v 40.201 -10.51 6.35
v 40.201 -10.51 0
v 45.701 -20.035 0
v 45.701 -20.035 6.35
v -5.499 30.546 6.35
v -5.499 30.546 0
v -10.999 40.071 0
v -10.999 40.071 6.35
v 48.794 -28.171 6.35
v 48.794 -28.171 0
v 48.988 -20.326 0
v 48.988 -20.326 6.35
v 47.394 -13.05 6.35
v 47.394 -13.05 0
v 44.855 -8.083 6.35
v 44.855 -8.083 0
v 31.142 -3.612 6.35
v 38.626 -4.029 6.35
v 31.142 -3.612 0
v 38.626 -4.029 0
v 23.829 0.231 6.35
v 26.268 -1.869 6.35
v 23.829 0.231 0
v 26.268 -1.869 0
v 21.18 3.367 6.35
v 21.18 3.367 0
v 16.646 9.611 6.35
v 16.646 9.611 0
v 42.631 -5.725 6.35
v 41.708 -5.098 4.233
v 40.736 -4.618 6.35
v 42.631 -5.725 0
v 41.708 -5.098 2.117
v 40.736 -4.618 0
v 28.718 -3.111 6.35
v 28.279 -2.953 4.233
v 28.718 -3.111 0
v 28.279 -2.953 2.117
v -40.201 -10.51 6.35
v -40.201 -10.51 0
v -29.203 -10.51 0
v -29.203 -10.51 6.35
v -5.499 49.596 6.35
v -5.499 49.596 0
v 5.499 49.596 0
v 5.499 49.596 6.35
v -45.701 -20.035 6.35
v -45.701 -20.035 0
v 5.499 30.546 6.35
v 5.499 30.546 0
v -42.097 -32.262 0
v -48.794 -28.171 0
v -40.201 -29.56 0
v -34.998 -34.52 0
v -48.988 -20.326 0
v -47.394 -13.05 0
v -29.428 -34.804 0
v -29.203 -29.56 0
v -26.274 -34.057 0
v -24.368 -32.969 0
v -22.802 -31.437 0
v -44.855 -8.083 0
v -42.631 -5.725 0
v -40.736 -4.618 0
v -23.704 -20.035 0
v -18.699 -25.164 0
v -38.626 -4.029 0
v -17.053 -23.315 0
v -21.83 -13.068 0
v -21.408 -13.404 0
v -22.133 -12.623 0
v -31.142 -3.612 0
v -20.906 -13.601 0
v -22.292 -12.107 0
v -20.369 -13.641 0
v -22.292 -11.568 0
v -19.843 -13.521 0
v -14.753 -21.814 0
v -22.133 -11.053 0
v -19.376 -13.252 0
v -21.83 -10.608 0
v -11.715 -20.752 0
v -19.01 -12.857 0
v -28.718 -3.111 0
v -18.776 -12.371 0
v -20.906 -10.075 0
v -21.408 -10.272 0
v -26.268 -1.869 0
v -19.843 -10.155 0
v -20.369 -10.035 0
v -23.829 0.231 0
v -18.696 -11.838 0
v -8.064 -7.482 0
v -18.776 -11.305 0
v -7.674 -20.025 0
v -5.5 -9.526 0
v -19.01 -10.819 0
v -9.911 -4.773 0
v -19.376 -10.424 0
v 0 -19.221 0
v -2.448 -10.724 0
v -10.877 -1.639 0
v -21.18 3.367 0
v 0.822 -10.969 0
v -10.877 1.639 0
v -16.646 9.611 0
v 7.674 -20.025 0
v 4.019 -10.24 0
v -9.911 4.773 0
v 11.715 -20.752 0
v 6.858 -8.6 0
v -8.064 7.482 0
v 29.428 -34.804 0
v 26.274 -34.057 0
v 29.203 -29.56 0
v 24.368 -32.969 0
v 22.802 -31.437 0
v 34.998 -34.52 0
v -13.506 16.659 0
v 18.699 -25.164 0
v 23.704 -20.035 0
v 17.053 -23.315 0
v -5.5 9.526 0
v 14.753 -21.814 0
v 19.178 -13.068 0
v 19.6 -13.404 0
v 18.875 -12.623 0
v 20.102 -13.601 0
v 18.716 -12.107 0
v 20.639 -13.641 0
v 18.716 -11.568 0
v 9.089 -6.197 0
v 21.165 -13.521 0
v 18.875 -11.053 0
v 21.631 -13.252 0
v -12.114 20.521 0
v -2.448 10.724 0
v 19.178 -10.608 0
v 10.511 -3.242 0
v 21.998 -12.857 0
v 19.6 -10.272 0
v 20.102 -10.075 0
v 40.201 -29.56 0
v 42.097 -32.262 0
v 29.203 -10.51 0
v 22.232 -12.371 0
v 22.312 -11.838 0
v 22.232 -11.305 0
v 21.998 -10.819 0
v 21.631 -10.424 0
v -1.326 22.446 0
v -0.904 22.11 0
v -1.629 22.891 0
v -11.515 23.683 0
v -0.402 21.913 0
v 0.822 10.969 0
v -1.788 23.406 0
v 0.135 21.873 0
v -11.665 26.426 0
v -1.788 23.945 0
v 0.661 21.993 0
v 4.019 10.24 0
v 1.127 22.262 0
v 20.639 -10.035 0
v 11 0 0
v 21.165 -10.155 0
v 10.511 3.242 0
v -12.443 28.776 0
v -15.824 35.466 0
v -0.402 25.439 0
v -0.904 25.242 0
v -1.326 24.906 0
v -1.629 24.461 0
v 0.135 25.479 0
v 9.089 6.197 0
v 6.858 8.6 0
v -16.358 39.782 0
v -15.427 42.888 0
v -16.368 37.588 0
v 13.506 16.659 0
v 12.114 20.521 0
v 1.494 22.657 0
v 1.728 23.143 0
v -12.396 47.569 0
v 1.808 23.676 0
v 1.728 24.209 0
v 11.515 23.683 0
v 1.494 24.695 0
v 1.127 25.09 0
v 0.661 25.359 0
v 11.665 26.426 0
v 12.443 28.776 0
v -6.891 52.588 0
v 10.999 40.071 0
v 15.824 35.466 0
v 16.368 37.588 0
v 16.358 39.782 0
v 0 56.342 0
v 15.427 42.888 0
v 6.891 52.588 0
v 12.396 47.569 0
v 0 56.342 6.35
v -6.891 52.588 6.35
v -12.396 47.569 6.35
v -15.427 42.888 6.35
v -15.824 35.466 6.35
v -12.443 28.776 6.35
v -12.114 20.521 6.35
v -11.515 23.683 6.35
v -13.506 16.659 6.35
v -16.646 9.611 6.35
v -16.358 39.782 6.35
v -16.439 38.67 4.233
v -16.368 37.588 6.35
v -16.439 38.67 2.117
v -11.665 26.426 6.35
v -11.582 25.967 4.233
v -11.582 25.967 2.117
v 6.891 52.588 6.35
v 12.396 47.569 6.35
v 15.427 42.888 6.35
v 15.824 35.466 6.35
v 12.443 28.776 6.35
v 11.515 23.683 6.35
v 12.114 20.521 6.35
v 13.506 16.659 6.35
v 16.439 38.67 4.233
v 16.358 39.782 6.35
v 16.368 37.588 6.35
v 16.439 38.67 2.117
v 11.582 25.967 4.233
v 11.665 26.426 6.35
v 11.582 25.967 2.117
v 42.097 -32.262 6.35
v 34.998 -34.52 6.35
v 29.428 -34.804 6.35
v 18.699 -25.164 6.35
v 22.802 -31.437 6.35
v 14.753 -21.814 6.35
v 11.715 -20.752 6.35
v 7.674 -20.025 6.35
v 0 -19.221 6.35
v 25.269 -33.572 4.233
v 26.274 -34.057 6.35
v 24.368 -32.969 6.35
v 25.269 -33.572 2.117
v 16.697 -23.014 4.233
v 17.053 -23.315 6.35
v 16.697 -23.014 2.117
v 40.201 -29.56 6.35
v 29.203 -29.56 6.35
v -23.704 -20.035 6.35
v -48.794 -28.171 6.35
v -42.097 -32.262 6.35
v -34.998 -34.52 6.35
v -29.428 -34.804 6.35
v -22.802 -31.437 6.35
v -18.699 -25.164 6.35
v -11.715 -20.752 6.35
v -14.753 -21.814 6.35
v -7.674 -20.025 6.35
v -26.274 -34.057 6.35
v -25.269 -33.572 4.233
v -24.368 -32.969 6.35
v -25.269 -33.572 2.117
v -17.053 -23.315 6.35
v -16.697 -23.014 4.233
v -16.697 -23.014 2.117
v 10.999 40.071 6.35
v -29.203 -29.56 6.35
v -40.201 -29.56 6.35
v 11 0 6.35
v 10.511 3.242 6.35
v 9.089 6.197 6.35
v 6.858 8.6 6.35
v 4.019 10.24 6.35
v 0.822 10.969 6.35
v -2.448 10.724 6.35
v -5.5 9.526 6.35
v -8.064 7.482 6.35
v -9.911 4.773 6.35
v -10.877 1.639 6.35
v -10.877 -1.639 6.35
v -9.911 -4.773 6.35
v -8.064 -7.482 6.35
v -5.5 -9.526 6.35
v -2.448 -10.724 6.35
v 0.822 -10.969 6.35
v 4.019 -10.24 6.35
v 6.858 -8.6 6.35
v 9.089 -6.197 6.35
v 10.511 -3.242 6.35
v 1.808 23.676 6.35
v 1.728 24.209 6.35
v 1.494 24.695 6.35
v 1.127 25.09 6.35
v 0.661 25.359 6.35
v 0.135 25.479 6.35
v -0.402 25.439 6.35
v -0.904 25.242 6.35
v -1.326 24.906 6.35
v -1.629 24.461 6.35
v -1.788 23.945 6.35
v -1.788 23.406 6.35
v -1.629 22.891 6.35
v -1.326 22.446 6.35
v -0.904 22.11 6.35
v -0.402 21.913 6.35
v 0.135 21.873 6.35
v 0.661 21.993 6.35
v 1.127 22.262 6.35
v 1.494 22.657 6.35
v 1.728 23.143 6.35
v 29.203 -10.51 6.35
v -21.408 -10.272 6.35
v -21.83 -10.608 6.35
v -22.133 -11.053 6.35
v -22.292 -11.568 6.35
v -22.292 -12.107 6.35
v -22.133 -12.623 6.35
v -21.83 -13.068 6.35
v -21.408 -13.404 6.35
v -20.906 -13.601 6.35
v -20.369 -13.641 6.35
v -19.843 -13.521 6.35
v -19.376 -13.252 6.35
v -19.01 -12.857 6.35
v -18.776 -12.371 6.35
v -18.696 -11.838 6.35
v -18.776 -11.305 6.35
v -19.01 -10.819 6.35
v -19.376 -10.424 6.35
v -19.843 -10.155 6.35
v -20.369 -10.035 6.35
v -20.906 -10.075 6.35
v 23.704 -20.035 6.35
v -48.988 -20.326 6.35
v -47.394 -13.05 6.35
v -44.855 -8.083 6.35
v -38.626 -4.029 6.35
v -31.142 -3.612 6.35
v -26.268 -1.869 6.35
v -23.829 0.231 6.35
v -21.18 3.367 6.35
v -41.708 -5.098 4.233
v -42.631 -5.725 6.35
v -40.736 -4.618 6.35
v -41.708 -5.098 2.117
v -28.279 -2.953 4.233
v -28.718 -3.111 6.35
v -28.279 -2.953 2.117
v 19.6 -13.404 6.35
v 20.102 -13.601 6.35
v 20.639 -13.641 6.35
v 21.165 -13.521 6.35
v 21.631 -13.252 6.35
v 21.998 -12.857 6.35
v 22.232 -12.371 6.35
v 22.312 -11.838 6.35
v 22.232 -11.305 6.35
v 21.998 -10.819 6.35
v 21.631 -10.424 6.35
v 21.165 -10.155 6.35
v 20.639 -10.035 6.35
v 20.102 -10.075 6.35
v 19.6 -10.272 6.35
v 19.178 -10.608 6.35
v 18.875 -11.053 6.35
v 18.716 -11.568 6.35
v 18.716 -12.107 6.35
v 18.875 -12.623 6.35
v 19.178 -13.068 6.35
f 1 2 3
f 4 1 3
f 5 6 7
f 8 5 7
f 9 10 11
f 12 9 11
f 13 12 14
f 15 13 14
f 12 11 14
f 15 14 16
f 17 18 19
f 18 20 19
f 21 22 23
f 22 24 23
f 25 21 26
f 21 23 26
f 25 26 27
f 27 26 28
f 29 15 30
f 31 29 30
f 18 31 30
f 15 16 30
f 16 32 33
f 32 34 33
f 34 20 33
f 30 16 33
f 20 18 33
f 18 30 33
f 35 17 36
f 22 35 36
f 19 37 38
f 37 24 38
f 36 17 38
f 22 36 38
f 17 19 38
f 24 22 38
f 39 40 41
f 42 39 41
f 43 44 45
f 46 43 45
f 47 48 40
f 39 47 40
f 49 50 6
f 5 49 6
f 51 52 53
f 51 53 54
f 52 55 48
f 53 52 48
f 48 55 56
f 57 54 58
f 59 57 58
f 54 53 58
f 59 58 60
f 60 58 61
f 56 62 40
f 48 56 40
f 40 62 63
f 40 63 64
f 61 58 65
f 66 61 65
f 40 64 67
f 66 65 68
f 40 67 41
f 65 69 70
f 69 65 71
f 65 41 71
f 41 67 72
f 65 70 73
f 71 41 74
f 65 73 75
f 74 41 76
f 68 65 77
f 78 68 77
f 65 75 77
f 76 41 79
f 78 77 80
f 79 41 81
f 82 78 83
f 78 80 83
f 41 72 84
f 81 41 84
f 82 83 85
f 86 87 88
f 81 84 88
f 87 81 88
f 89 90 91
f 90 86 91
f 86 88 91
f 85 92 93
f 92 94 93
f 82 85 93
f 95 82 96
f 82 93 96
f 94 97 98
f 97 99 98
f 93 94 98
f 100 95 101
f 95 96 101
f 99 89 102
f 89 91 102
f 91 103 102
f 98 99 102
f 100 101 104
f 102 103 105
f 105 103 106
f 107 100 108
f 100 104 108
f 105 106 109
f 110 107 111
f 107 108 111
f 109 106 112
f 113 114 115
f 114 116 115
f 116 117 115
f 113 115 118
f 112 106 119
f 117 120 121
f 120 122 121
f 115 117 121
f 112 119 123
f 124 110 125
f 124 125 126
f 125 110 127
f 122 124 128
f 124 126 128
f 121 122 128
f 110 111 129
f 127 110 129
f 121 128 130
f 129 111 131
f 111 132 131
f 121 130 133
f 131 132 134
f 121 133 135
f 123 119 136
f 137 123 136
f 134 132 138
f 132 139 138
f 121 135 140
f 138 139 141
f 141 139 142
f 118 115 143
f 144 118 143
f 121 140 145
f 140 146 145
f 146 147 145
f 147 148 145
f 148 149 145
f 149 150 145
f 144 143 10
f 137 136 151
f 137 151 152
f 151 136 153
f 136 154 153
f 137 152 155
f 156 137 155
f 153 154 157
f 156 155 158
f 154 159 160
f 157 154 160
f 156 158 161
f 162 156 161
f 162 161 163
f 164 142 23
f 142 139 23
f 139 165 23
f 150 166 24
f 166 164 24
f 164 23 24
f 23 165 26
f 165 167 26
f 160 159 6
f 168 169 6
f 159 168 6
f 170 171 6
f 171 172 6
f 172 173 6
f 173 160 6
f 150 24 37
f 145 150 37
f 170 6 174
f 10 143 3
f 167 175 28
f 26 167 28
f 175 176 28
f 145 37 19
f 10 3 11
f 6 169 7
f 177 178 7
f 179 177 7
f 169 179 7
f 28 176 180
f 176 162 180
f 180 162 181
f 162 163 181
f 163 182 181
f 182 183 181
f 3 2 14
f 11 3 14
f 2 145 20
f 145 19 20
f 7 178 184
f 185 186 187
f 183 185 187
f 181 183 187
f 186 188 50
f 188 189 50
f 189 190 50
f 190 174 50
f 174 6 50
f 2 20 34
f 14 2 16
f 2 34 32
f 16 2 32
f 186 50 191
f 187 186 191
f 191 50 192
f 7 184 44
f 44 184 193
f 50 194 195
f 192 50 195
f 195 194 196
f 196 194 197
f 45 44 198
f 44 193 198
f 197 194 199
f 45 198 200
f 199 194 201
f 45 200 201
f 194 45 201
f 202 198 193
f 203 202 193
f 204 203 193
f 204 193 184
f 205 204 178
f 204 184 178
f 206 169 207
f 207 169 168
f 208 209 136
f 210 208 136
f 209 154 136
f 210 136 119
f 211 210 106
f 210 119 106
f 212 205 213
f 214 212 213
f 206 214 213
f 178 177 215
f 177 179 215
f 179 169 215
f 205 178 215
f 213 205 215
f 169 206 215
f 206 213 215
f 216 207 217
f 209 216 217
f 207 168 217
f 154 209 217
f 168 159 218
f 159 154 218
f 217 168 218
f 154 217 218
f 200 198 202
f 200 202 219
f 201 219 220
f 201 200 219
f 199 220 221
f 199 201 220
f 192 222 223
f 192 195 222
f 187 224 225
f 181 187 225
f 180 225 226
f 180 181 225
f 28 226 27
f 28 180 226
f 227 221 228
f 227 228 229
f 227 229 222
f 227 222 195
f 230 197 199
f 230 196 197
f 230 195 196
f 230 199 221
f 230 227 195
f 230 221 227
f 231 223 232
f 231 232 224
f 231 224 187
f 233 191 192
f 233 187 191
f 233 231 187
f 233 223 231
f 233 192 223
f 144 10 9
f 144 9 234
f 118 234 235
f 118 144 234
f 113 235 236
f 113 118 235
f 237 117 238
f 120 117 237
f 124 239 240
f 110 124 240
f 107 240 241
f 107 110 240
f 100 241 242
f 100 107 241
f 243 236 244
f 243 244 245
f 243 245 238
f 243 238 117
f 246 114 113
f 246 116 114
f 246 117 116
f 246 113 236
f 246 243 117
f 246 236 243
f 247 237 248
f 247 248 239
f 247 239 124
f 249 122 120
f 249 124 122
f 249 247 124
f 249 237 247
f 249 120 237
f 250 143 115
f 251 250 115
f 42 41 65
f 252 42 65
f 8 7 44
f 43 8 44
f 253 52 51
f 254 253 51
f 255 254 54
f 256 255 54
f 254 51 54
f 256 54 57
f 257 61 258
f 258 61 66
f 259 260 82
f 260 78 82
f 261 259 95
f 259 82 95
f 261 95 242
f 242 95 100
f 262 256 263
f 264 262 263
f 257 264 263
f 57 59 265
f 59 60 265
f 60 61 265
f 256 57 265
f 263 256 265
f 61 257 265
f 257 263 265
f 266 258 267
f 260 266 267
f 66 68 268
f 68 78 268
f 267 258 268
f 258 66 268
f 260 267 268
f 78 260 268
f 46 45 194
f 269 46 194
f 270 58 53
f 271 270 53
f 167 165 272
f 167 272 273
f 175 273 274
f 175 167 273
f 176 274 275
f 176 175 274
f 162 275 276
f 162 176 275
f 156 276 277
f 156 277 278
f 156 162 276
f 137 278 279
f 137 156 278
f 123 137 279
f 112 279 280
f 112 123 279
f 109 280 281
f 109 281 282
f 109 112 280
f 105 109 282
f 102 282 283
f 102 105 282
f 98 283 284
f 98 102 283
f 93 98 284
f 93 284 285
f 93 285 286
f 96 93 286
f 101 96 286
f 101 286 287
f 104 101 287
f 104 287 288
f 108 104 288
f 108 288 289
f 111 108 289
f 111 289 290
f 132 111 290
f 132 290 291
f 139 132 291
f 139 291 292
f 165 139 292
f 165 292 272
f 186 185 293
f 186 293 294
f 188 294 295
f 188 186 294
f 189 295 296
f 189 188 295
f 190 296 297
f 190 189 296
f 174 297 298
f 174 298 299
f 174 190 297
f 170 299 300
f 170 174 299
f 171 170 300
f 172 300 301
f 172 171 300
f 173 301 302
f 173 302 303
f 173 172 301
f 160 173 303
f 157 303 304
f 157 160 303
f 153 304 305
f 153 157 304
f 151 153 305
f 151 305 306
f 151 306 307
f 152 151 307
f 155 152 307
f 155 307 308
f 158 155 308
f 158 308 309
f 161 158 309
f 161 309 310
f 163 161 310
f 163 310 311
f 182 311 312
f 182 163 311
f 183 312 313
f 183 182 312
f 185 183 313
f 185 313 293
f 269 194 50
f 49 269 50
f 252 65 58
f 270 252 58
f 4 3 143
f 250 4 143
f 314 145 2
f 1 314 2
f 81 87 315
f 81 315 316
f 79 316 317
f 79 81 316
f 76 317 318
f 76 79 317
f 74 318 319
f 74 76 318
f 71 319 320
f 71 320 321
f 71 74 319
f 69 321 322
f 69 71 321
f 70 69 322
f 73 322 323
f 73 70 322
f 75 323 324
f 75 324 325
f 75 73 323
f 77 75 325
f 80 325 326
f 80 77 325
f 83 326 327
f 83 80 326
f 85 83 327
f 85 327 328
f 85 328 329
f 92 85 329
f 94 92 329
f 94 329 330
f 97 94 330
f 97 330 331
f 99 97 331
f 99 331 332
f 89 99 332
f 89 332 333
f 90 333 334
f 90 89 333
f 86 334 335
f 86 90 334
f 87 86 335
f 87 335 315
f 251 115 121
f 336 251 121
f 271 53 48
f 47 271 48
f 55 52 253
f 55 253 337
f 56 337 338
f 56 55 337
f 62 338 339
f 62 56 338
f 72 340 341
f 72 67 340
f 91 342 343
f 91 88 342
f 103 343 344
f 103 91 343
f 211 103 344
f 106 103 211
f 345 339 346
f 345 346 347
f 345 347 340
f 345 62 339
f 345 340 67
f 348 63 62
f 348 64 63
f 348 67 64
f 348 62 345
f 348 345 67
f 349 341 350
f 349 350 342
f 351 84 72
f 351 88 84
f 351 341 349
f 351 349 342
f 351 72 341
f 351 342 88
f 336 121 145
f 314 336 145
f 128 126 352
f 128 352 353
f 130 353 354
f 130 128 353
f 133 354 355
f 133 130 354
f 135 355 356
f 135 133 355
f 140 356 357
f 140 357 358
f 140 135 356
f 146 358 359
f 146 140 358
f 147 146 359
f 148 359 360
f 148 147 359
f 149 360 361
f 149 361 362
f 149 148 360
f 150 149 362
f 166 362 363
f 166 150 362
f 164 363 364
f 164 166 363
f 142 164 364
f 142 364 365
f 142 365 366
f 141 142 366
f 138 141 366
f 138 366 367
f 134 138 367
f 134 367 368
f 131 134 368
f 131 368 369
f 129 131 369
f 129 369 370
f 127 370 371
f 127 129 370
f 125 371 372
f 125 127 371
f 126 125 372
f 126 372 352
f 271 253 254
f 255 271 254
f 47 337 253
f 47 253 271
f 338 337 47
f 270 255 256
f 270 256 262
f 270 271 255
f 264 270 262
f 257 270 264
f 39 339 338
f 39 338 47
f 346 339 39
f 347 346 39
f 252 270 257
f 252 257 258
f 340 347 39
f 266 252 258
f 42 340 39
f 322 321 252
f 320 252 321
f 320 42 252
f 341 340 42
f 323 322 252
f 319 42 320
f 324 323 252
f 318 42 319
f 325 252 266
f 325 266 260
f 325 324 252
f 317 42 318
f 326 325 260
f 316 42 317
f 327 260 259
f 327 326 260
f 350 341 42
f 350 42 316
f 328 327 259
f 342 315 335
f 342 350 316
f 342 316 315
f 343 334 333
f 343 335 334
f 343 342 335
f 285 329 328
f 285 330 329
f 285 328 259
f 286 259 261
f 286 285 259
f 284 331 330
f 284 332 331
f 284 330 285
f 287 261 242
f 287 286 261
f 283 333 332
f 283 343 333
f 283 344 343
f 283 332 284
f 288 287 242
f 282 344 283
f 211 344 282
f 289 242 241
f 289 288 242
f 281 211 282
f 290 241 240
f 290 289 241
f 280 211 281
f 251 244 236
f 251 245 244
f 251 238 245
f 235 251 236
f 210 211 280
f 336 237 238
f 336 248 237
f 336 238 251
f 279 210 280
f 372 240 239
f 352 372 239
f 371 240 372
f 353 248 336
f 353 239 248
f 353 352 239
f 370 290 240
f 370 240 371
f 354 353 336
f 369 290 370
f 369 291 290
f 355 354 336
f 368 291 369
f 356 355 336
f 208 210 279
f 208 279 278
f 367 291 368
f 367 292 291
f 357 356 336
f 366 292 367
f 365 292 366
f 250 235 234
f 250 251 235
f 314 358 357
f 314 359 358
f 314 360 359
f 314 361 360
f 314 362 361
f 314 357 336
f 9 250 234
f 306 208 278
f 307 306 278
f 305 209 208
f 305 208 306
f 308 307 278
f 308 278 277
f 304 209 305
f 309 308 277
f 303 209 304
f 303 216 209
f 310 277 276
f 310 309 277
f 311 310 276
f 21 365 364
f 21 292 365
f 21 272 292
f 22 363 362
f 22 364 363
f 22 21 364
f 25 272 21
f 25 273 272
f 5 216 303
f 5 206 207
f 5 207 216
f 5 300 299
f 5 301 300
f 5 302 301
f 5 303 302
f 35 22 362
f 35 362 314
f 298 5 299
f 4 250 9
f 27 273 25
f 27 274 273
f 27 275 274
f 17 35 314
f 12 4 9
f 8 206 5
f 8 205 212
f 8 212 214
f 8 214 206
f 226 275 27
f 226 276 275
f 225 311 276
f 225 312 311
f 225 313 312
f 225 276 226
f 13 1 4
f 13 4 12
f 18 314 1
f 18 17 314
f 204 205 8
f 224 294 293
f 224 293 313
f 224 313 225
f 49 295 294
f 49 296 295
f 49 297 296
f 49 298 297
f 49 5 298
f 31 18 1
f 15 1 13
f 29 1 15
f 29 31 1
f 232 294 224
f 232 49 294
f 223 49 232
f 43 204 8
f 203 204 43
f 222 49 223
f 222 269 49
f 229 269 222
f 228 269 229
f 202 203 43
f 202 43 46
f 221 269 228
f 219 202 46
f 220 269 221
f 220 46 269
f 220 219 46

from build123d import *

# Parameters (mm, degrees)
F0_R     = 11
F0_R_2   = 1.8083680483
F1_DEPTH = 6.35
F2_COUNT = 3


# Not quite as in the source:
# - a feature names something its author has since deleted; it is built from what else it names


with BuildPart() as f1:
    # F0 (on Top) → F1 (new body)
    with BuildSketch(Plane.XY):
        with BuildLine():
            ThreePointArc((-16.7417324202, 9.3803920133), (-4.8473828231, -18.5682588984), (19.1905538938, 0))
            ThreePointArc((19.1905538938, 0), (18.5682588984, 4.8473828231), (16.7417324202, 9.3803920133))
            ThreePointArc((16.7417324202, 9.3803920133), (0, 19.1905538938), (-16.7417324202, 9.3803920133))
        make_face()
        Circle(F0_R, mode=Mode.SUBTRACT)
        with BuildLine():
            ThreePointArc((-16.7417324202, 9.3803920133), (0, 19.1905538938), (16.7417324202, 9.3803920133))
            add(Edge.make_bspline(
                [(0, 56.3421584666), (8.906448223, 52.8720755357), (22.0493176942, 38.8214841524), (7.5183827246, 26.377110806), (14.5397577828, 14.7355665073), (16.7417324202, 9.3803920133)],
                knots=[0, 0, 0, 0, 0.3847676827, 0.6735899971, 1, 1, 1, 1], degree=3))
            add(Edge.make_bspline(
                [(0, 56.3421584666), (-8.906448223, 52.8720755357), (-22.0493176942, 38.8214841524), (-7.5183827246, 26.377110806), (-14.5397577828, 14.7355665073), (-16.7417324202, 9.3803920133)],
                knots=[0, 0, 0, 0, 0.3847676827, 0.6735899971, 1, 1, 1, 1], degree=3))
        make_face()
        with Locations((0, 23.6759167165)):
            Circle(F0_R_2, mode=Mode.SUBTRACT)
        Polygon((10.9985226281, 40.0706864893), (5.499261314, 30.5456864893), (-5.499261314, 30.5456864893), (-10.9985226281, 40.0706864893), (-5.499261314, 49.5956864893), (5.499261314, 49.5956864893), align=None, mode=Mode.SUBTRACT)
    extrude(amount=F1_DEPTH)

    # F2: F1 ×3 about axis
    f2_axis = Axis((0, 0, 0), (0, 0, -1))


with BuildPart() as f1_1:
    add(f1.part)
    for i in range(1, F2_COUNT):
        add(f1.part.rotate(f2_axis, i * 360 / F2_COUNT))


solid = f1_1.part
